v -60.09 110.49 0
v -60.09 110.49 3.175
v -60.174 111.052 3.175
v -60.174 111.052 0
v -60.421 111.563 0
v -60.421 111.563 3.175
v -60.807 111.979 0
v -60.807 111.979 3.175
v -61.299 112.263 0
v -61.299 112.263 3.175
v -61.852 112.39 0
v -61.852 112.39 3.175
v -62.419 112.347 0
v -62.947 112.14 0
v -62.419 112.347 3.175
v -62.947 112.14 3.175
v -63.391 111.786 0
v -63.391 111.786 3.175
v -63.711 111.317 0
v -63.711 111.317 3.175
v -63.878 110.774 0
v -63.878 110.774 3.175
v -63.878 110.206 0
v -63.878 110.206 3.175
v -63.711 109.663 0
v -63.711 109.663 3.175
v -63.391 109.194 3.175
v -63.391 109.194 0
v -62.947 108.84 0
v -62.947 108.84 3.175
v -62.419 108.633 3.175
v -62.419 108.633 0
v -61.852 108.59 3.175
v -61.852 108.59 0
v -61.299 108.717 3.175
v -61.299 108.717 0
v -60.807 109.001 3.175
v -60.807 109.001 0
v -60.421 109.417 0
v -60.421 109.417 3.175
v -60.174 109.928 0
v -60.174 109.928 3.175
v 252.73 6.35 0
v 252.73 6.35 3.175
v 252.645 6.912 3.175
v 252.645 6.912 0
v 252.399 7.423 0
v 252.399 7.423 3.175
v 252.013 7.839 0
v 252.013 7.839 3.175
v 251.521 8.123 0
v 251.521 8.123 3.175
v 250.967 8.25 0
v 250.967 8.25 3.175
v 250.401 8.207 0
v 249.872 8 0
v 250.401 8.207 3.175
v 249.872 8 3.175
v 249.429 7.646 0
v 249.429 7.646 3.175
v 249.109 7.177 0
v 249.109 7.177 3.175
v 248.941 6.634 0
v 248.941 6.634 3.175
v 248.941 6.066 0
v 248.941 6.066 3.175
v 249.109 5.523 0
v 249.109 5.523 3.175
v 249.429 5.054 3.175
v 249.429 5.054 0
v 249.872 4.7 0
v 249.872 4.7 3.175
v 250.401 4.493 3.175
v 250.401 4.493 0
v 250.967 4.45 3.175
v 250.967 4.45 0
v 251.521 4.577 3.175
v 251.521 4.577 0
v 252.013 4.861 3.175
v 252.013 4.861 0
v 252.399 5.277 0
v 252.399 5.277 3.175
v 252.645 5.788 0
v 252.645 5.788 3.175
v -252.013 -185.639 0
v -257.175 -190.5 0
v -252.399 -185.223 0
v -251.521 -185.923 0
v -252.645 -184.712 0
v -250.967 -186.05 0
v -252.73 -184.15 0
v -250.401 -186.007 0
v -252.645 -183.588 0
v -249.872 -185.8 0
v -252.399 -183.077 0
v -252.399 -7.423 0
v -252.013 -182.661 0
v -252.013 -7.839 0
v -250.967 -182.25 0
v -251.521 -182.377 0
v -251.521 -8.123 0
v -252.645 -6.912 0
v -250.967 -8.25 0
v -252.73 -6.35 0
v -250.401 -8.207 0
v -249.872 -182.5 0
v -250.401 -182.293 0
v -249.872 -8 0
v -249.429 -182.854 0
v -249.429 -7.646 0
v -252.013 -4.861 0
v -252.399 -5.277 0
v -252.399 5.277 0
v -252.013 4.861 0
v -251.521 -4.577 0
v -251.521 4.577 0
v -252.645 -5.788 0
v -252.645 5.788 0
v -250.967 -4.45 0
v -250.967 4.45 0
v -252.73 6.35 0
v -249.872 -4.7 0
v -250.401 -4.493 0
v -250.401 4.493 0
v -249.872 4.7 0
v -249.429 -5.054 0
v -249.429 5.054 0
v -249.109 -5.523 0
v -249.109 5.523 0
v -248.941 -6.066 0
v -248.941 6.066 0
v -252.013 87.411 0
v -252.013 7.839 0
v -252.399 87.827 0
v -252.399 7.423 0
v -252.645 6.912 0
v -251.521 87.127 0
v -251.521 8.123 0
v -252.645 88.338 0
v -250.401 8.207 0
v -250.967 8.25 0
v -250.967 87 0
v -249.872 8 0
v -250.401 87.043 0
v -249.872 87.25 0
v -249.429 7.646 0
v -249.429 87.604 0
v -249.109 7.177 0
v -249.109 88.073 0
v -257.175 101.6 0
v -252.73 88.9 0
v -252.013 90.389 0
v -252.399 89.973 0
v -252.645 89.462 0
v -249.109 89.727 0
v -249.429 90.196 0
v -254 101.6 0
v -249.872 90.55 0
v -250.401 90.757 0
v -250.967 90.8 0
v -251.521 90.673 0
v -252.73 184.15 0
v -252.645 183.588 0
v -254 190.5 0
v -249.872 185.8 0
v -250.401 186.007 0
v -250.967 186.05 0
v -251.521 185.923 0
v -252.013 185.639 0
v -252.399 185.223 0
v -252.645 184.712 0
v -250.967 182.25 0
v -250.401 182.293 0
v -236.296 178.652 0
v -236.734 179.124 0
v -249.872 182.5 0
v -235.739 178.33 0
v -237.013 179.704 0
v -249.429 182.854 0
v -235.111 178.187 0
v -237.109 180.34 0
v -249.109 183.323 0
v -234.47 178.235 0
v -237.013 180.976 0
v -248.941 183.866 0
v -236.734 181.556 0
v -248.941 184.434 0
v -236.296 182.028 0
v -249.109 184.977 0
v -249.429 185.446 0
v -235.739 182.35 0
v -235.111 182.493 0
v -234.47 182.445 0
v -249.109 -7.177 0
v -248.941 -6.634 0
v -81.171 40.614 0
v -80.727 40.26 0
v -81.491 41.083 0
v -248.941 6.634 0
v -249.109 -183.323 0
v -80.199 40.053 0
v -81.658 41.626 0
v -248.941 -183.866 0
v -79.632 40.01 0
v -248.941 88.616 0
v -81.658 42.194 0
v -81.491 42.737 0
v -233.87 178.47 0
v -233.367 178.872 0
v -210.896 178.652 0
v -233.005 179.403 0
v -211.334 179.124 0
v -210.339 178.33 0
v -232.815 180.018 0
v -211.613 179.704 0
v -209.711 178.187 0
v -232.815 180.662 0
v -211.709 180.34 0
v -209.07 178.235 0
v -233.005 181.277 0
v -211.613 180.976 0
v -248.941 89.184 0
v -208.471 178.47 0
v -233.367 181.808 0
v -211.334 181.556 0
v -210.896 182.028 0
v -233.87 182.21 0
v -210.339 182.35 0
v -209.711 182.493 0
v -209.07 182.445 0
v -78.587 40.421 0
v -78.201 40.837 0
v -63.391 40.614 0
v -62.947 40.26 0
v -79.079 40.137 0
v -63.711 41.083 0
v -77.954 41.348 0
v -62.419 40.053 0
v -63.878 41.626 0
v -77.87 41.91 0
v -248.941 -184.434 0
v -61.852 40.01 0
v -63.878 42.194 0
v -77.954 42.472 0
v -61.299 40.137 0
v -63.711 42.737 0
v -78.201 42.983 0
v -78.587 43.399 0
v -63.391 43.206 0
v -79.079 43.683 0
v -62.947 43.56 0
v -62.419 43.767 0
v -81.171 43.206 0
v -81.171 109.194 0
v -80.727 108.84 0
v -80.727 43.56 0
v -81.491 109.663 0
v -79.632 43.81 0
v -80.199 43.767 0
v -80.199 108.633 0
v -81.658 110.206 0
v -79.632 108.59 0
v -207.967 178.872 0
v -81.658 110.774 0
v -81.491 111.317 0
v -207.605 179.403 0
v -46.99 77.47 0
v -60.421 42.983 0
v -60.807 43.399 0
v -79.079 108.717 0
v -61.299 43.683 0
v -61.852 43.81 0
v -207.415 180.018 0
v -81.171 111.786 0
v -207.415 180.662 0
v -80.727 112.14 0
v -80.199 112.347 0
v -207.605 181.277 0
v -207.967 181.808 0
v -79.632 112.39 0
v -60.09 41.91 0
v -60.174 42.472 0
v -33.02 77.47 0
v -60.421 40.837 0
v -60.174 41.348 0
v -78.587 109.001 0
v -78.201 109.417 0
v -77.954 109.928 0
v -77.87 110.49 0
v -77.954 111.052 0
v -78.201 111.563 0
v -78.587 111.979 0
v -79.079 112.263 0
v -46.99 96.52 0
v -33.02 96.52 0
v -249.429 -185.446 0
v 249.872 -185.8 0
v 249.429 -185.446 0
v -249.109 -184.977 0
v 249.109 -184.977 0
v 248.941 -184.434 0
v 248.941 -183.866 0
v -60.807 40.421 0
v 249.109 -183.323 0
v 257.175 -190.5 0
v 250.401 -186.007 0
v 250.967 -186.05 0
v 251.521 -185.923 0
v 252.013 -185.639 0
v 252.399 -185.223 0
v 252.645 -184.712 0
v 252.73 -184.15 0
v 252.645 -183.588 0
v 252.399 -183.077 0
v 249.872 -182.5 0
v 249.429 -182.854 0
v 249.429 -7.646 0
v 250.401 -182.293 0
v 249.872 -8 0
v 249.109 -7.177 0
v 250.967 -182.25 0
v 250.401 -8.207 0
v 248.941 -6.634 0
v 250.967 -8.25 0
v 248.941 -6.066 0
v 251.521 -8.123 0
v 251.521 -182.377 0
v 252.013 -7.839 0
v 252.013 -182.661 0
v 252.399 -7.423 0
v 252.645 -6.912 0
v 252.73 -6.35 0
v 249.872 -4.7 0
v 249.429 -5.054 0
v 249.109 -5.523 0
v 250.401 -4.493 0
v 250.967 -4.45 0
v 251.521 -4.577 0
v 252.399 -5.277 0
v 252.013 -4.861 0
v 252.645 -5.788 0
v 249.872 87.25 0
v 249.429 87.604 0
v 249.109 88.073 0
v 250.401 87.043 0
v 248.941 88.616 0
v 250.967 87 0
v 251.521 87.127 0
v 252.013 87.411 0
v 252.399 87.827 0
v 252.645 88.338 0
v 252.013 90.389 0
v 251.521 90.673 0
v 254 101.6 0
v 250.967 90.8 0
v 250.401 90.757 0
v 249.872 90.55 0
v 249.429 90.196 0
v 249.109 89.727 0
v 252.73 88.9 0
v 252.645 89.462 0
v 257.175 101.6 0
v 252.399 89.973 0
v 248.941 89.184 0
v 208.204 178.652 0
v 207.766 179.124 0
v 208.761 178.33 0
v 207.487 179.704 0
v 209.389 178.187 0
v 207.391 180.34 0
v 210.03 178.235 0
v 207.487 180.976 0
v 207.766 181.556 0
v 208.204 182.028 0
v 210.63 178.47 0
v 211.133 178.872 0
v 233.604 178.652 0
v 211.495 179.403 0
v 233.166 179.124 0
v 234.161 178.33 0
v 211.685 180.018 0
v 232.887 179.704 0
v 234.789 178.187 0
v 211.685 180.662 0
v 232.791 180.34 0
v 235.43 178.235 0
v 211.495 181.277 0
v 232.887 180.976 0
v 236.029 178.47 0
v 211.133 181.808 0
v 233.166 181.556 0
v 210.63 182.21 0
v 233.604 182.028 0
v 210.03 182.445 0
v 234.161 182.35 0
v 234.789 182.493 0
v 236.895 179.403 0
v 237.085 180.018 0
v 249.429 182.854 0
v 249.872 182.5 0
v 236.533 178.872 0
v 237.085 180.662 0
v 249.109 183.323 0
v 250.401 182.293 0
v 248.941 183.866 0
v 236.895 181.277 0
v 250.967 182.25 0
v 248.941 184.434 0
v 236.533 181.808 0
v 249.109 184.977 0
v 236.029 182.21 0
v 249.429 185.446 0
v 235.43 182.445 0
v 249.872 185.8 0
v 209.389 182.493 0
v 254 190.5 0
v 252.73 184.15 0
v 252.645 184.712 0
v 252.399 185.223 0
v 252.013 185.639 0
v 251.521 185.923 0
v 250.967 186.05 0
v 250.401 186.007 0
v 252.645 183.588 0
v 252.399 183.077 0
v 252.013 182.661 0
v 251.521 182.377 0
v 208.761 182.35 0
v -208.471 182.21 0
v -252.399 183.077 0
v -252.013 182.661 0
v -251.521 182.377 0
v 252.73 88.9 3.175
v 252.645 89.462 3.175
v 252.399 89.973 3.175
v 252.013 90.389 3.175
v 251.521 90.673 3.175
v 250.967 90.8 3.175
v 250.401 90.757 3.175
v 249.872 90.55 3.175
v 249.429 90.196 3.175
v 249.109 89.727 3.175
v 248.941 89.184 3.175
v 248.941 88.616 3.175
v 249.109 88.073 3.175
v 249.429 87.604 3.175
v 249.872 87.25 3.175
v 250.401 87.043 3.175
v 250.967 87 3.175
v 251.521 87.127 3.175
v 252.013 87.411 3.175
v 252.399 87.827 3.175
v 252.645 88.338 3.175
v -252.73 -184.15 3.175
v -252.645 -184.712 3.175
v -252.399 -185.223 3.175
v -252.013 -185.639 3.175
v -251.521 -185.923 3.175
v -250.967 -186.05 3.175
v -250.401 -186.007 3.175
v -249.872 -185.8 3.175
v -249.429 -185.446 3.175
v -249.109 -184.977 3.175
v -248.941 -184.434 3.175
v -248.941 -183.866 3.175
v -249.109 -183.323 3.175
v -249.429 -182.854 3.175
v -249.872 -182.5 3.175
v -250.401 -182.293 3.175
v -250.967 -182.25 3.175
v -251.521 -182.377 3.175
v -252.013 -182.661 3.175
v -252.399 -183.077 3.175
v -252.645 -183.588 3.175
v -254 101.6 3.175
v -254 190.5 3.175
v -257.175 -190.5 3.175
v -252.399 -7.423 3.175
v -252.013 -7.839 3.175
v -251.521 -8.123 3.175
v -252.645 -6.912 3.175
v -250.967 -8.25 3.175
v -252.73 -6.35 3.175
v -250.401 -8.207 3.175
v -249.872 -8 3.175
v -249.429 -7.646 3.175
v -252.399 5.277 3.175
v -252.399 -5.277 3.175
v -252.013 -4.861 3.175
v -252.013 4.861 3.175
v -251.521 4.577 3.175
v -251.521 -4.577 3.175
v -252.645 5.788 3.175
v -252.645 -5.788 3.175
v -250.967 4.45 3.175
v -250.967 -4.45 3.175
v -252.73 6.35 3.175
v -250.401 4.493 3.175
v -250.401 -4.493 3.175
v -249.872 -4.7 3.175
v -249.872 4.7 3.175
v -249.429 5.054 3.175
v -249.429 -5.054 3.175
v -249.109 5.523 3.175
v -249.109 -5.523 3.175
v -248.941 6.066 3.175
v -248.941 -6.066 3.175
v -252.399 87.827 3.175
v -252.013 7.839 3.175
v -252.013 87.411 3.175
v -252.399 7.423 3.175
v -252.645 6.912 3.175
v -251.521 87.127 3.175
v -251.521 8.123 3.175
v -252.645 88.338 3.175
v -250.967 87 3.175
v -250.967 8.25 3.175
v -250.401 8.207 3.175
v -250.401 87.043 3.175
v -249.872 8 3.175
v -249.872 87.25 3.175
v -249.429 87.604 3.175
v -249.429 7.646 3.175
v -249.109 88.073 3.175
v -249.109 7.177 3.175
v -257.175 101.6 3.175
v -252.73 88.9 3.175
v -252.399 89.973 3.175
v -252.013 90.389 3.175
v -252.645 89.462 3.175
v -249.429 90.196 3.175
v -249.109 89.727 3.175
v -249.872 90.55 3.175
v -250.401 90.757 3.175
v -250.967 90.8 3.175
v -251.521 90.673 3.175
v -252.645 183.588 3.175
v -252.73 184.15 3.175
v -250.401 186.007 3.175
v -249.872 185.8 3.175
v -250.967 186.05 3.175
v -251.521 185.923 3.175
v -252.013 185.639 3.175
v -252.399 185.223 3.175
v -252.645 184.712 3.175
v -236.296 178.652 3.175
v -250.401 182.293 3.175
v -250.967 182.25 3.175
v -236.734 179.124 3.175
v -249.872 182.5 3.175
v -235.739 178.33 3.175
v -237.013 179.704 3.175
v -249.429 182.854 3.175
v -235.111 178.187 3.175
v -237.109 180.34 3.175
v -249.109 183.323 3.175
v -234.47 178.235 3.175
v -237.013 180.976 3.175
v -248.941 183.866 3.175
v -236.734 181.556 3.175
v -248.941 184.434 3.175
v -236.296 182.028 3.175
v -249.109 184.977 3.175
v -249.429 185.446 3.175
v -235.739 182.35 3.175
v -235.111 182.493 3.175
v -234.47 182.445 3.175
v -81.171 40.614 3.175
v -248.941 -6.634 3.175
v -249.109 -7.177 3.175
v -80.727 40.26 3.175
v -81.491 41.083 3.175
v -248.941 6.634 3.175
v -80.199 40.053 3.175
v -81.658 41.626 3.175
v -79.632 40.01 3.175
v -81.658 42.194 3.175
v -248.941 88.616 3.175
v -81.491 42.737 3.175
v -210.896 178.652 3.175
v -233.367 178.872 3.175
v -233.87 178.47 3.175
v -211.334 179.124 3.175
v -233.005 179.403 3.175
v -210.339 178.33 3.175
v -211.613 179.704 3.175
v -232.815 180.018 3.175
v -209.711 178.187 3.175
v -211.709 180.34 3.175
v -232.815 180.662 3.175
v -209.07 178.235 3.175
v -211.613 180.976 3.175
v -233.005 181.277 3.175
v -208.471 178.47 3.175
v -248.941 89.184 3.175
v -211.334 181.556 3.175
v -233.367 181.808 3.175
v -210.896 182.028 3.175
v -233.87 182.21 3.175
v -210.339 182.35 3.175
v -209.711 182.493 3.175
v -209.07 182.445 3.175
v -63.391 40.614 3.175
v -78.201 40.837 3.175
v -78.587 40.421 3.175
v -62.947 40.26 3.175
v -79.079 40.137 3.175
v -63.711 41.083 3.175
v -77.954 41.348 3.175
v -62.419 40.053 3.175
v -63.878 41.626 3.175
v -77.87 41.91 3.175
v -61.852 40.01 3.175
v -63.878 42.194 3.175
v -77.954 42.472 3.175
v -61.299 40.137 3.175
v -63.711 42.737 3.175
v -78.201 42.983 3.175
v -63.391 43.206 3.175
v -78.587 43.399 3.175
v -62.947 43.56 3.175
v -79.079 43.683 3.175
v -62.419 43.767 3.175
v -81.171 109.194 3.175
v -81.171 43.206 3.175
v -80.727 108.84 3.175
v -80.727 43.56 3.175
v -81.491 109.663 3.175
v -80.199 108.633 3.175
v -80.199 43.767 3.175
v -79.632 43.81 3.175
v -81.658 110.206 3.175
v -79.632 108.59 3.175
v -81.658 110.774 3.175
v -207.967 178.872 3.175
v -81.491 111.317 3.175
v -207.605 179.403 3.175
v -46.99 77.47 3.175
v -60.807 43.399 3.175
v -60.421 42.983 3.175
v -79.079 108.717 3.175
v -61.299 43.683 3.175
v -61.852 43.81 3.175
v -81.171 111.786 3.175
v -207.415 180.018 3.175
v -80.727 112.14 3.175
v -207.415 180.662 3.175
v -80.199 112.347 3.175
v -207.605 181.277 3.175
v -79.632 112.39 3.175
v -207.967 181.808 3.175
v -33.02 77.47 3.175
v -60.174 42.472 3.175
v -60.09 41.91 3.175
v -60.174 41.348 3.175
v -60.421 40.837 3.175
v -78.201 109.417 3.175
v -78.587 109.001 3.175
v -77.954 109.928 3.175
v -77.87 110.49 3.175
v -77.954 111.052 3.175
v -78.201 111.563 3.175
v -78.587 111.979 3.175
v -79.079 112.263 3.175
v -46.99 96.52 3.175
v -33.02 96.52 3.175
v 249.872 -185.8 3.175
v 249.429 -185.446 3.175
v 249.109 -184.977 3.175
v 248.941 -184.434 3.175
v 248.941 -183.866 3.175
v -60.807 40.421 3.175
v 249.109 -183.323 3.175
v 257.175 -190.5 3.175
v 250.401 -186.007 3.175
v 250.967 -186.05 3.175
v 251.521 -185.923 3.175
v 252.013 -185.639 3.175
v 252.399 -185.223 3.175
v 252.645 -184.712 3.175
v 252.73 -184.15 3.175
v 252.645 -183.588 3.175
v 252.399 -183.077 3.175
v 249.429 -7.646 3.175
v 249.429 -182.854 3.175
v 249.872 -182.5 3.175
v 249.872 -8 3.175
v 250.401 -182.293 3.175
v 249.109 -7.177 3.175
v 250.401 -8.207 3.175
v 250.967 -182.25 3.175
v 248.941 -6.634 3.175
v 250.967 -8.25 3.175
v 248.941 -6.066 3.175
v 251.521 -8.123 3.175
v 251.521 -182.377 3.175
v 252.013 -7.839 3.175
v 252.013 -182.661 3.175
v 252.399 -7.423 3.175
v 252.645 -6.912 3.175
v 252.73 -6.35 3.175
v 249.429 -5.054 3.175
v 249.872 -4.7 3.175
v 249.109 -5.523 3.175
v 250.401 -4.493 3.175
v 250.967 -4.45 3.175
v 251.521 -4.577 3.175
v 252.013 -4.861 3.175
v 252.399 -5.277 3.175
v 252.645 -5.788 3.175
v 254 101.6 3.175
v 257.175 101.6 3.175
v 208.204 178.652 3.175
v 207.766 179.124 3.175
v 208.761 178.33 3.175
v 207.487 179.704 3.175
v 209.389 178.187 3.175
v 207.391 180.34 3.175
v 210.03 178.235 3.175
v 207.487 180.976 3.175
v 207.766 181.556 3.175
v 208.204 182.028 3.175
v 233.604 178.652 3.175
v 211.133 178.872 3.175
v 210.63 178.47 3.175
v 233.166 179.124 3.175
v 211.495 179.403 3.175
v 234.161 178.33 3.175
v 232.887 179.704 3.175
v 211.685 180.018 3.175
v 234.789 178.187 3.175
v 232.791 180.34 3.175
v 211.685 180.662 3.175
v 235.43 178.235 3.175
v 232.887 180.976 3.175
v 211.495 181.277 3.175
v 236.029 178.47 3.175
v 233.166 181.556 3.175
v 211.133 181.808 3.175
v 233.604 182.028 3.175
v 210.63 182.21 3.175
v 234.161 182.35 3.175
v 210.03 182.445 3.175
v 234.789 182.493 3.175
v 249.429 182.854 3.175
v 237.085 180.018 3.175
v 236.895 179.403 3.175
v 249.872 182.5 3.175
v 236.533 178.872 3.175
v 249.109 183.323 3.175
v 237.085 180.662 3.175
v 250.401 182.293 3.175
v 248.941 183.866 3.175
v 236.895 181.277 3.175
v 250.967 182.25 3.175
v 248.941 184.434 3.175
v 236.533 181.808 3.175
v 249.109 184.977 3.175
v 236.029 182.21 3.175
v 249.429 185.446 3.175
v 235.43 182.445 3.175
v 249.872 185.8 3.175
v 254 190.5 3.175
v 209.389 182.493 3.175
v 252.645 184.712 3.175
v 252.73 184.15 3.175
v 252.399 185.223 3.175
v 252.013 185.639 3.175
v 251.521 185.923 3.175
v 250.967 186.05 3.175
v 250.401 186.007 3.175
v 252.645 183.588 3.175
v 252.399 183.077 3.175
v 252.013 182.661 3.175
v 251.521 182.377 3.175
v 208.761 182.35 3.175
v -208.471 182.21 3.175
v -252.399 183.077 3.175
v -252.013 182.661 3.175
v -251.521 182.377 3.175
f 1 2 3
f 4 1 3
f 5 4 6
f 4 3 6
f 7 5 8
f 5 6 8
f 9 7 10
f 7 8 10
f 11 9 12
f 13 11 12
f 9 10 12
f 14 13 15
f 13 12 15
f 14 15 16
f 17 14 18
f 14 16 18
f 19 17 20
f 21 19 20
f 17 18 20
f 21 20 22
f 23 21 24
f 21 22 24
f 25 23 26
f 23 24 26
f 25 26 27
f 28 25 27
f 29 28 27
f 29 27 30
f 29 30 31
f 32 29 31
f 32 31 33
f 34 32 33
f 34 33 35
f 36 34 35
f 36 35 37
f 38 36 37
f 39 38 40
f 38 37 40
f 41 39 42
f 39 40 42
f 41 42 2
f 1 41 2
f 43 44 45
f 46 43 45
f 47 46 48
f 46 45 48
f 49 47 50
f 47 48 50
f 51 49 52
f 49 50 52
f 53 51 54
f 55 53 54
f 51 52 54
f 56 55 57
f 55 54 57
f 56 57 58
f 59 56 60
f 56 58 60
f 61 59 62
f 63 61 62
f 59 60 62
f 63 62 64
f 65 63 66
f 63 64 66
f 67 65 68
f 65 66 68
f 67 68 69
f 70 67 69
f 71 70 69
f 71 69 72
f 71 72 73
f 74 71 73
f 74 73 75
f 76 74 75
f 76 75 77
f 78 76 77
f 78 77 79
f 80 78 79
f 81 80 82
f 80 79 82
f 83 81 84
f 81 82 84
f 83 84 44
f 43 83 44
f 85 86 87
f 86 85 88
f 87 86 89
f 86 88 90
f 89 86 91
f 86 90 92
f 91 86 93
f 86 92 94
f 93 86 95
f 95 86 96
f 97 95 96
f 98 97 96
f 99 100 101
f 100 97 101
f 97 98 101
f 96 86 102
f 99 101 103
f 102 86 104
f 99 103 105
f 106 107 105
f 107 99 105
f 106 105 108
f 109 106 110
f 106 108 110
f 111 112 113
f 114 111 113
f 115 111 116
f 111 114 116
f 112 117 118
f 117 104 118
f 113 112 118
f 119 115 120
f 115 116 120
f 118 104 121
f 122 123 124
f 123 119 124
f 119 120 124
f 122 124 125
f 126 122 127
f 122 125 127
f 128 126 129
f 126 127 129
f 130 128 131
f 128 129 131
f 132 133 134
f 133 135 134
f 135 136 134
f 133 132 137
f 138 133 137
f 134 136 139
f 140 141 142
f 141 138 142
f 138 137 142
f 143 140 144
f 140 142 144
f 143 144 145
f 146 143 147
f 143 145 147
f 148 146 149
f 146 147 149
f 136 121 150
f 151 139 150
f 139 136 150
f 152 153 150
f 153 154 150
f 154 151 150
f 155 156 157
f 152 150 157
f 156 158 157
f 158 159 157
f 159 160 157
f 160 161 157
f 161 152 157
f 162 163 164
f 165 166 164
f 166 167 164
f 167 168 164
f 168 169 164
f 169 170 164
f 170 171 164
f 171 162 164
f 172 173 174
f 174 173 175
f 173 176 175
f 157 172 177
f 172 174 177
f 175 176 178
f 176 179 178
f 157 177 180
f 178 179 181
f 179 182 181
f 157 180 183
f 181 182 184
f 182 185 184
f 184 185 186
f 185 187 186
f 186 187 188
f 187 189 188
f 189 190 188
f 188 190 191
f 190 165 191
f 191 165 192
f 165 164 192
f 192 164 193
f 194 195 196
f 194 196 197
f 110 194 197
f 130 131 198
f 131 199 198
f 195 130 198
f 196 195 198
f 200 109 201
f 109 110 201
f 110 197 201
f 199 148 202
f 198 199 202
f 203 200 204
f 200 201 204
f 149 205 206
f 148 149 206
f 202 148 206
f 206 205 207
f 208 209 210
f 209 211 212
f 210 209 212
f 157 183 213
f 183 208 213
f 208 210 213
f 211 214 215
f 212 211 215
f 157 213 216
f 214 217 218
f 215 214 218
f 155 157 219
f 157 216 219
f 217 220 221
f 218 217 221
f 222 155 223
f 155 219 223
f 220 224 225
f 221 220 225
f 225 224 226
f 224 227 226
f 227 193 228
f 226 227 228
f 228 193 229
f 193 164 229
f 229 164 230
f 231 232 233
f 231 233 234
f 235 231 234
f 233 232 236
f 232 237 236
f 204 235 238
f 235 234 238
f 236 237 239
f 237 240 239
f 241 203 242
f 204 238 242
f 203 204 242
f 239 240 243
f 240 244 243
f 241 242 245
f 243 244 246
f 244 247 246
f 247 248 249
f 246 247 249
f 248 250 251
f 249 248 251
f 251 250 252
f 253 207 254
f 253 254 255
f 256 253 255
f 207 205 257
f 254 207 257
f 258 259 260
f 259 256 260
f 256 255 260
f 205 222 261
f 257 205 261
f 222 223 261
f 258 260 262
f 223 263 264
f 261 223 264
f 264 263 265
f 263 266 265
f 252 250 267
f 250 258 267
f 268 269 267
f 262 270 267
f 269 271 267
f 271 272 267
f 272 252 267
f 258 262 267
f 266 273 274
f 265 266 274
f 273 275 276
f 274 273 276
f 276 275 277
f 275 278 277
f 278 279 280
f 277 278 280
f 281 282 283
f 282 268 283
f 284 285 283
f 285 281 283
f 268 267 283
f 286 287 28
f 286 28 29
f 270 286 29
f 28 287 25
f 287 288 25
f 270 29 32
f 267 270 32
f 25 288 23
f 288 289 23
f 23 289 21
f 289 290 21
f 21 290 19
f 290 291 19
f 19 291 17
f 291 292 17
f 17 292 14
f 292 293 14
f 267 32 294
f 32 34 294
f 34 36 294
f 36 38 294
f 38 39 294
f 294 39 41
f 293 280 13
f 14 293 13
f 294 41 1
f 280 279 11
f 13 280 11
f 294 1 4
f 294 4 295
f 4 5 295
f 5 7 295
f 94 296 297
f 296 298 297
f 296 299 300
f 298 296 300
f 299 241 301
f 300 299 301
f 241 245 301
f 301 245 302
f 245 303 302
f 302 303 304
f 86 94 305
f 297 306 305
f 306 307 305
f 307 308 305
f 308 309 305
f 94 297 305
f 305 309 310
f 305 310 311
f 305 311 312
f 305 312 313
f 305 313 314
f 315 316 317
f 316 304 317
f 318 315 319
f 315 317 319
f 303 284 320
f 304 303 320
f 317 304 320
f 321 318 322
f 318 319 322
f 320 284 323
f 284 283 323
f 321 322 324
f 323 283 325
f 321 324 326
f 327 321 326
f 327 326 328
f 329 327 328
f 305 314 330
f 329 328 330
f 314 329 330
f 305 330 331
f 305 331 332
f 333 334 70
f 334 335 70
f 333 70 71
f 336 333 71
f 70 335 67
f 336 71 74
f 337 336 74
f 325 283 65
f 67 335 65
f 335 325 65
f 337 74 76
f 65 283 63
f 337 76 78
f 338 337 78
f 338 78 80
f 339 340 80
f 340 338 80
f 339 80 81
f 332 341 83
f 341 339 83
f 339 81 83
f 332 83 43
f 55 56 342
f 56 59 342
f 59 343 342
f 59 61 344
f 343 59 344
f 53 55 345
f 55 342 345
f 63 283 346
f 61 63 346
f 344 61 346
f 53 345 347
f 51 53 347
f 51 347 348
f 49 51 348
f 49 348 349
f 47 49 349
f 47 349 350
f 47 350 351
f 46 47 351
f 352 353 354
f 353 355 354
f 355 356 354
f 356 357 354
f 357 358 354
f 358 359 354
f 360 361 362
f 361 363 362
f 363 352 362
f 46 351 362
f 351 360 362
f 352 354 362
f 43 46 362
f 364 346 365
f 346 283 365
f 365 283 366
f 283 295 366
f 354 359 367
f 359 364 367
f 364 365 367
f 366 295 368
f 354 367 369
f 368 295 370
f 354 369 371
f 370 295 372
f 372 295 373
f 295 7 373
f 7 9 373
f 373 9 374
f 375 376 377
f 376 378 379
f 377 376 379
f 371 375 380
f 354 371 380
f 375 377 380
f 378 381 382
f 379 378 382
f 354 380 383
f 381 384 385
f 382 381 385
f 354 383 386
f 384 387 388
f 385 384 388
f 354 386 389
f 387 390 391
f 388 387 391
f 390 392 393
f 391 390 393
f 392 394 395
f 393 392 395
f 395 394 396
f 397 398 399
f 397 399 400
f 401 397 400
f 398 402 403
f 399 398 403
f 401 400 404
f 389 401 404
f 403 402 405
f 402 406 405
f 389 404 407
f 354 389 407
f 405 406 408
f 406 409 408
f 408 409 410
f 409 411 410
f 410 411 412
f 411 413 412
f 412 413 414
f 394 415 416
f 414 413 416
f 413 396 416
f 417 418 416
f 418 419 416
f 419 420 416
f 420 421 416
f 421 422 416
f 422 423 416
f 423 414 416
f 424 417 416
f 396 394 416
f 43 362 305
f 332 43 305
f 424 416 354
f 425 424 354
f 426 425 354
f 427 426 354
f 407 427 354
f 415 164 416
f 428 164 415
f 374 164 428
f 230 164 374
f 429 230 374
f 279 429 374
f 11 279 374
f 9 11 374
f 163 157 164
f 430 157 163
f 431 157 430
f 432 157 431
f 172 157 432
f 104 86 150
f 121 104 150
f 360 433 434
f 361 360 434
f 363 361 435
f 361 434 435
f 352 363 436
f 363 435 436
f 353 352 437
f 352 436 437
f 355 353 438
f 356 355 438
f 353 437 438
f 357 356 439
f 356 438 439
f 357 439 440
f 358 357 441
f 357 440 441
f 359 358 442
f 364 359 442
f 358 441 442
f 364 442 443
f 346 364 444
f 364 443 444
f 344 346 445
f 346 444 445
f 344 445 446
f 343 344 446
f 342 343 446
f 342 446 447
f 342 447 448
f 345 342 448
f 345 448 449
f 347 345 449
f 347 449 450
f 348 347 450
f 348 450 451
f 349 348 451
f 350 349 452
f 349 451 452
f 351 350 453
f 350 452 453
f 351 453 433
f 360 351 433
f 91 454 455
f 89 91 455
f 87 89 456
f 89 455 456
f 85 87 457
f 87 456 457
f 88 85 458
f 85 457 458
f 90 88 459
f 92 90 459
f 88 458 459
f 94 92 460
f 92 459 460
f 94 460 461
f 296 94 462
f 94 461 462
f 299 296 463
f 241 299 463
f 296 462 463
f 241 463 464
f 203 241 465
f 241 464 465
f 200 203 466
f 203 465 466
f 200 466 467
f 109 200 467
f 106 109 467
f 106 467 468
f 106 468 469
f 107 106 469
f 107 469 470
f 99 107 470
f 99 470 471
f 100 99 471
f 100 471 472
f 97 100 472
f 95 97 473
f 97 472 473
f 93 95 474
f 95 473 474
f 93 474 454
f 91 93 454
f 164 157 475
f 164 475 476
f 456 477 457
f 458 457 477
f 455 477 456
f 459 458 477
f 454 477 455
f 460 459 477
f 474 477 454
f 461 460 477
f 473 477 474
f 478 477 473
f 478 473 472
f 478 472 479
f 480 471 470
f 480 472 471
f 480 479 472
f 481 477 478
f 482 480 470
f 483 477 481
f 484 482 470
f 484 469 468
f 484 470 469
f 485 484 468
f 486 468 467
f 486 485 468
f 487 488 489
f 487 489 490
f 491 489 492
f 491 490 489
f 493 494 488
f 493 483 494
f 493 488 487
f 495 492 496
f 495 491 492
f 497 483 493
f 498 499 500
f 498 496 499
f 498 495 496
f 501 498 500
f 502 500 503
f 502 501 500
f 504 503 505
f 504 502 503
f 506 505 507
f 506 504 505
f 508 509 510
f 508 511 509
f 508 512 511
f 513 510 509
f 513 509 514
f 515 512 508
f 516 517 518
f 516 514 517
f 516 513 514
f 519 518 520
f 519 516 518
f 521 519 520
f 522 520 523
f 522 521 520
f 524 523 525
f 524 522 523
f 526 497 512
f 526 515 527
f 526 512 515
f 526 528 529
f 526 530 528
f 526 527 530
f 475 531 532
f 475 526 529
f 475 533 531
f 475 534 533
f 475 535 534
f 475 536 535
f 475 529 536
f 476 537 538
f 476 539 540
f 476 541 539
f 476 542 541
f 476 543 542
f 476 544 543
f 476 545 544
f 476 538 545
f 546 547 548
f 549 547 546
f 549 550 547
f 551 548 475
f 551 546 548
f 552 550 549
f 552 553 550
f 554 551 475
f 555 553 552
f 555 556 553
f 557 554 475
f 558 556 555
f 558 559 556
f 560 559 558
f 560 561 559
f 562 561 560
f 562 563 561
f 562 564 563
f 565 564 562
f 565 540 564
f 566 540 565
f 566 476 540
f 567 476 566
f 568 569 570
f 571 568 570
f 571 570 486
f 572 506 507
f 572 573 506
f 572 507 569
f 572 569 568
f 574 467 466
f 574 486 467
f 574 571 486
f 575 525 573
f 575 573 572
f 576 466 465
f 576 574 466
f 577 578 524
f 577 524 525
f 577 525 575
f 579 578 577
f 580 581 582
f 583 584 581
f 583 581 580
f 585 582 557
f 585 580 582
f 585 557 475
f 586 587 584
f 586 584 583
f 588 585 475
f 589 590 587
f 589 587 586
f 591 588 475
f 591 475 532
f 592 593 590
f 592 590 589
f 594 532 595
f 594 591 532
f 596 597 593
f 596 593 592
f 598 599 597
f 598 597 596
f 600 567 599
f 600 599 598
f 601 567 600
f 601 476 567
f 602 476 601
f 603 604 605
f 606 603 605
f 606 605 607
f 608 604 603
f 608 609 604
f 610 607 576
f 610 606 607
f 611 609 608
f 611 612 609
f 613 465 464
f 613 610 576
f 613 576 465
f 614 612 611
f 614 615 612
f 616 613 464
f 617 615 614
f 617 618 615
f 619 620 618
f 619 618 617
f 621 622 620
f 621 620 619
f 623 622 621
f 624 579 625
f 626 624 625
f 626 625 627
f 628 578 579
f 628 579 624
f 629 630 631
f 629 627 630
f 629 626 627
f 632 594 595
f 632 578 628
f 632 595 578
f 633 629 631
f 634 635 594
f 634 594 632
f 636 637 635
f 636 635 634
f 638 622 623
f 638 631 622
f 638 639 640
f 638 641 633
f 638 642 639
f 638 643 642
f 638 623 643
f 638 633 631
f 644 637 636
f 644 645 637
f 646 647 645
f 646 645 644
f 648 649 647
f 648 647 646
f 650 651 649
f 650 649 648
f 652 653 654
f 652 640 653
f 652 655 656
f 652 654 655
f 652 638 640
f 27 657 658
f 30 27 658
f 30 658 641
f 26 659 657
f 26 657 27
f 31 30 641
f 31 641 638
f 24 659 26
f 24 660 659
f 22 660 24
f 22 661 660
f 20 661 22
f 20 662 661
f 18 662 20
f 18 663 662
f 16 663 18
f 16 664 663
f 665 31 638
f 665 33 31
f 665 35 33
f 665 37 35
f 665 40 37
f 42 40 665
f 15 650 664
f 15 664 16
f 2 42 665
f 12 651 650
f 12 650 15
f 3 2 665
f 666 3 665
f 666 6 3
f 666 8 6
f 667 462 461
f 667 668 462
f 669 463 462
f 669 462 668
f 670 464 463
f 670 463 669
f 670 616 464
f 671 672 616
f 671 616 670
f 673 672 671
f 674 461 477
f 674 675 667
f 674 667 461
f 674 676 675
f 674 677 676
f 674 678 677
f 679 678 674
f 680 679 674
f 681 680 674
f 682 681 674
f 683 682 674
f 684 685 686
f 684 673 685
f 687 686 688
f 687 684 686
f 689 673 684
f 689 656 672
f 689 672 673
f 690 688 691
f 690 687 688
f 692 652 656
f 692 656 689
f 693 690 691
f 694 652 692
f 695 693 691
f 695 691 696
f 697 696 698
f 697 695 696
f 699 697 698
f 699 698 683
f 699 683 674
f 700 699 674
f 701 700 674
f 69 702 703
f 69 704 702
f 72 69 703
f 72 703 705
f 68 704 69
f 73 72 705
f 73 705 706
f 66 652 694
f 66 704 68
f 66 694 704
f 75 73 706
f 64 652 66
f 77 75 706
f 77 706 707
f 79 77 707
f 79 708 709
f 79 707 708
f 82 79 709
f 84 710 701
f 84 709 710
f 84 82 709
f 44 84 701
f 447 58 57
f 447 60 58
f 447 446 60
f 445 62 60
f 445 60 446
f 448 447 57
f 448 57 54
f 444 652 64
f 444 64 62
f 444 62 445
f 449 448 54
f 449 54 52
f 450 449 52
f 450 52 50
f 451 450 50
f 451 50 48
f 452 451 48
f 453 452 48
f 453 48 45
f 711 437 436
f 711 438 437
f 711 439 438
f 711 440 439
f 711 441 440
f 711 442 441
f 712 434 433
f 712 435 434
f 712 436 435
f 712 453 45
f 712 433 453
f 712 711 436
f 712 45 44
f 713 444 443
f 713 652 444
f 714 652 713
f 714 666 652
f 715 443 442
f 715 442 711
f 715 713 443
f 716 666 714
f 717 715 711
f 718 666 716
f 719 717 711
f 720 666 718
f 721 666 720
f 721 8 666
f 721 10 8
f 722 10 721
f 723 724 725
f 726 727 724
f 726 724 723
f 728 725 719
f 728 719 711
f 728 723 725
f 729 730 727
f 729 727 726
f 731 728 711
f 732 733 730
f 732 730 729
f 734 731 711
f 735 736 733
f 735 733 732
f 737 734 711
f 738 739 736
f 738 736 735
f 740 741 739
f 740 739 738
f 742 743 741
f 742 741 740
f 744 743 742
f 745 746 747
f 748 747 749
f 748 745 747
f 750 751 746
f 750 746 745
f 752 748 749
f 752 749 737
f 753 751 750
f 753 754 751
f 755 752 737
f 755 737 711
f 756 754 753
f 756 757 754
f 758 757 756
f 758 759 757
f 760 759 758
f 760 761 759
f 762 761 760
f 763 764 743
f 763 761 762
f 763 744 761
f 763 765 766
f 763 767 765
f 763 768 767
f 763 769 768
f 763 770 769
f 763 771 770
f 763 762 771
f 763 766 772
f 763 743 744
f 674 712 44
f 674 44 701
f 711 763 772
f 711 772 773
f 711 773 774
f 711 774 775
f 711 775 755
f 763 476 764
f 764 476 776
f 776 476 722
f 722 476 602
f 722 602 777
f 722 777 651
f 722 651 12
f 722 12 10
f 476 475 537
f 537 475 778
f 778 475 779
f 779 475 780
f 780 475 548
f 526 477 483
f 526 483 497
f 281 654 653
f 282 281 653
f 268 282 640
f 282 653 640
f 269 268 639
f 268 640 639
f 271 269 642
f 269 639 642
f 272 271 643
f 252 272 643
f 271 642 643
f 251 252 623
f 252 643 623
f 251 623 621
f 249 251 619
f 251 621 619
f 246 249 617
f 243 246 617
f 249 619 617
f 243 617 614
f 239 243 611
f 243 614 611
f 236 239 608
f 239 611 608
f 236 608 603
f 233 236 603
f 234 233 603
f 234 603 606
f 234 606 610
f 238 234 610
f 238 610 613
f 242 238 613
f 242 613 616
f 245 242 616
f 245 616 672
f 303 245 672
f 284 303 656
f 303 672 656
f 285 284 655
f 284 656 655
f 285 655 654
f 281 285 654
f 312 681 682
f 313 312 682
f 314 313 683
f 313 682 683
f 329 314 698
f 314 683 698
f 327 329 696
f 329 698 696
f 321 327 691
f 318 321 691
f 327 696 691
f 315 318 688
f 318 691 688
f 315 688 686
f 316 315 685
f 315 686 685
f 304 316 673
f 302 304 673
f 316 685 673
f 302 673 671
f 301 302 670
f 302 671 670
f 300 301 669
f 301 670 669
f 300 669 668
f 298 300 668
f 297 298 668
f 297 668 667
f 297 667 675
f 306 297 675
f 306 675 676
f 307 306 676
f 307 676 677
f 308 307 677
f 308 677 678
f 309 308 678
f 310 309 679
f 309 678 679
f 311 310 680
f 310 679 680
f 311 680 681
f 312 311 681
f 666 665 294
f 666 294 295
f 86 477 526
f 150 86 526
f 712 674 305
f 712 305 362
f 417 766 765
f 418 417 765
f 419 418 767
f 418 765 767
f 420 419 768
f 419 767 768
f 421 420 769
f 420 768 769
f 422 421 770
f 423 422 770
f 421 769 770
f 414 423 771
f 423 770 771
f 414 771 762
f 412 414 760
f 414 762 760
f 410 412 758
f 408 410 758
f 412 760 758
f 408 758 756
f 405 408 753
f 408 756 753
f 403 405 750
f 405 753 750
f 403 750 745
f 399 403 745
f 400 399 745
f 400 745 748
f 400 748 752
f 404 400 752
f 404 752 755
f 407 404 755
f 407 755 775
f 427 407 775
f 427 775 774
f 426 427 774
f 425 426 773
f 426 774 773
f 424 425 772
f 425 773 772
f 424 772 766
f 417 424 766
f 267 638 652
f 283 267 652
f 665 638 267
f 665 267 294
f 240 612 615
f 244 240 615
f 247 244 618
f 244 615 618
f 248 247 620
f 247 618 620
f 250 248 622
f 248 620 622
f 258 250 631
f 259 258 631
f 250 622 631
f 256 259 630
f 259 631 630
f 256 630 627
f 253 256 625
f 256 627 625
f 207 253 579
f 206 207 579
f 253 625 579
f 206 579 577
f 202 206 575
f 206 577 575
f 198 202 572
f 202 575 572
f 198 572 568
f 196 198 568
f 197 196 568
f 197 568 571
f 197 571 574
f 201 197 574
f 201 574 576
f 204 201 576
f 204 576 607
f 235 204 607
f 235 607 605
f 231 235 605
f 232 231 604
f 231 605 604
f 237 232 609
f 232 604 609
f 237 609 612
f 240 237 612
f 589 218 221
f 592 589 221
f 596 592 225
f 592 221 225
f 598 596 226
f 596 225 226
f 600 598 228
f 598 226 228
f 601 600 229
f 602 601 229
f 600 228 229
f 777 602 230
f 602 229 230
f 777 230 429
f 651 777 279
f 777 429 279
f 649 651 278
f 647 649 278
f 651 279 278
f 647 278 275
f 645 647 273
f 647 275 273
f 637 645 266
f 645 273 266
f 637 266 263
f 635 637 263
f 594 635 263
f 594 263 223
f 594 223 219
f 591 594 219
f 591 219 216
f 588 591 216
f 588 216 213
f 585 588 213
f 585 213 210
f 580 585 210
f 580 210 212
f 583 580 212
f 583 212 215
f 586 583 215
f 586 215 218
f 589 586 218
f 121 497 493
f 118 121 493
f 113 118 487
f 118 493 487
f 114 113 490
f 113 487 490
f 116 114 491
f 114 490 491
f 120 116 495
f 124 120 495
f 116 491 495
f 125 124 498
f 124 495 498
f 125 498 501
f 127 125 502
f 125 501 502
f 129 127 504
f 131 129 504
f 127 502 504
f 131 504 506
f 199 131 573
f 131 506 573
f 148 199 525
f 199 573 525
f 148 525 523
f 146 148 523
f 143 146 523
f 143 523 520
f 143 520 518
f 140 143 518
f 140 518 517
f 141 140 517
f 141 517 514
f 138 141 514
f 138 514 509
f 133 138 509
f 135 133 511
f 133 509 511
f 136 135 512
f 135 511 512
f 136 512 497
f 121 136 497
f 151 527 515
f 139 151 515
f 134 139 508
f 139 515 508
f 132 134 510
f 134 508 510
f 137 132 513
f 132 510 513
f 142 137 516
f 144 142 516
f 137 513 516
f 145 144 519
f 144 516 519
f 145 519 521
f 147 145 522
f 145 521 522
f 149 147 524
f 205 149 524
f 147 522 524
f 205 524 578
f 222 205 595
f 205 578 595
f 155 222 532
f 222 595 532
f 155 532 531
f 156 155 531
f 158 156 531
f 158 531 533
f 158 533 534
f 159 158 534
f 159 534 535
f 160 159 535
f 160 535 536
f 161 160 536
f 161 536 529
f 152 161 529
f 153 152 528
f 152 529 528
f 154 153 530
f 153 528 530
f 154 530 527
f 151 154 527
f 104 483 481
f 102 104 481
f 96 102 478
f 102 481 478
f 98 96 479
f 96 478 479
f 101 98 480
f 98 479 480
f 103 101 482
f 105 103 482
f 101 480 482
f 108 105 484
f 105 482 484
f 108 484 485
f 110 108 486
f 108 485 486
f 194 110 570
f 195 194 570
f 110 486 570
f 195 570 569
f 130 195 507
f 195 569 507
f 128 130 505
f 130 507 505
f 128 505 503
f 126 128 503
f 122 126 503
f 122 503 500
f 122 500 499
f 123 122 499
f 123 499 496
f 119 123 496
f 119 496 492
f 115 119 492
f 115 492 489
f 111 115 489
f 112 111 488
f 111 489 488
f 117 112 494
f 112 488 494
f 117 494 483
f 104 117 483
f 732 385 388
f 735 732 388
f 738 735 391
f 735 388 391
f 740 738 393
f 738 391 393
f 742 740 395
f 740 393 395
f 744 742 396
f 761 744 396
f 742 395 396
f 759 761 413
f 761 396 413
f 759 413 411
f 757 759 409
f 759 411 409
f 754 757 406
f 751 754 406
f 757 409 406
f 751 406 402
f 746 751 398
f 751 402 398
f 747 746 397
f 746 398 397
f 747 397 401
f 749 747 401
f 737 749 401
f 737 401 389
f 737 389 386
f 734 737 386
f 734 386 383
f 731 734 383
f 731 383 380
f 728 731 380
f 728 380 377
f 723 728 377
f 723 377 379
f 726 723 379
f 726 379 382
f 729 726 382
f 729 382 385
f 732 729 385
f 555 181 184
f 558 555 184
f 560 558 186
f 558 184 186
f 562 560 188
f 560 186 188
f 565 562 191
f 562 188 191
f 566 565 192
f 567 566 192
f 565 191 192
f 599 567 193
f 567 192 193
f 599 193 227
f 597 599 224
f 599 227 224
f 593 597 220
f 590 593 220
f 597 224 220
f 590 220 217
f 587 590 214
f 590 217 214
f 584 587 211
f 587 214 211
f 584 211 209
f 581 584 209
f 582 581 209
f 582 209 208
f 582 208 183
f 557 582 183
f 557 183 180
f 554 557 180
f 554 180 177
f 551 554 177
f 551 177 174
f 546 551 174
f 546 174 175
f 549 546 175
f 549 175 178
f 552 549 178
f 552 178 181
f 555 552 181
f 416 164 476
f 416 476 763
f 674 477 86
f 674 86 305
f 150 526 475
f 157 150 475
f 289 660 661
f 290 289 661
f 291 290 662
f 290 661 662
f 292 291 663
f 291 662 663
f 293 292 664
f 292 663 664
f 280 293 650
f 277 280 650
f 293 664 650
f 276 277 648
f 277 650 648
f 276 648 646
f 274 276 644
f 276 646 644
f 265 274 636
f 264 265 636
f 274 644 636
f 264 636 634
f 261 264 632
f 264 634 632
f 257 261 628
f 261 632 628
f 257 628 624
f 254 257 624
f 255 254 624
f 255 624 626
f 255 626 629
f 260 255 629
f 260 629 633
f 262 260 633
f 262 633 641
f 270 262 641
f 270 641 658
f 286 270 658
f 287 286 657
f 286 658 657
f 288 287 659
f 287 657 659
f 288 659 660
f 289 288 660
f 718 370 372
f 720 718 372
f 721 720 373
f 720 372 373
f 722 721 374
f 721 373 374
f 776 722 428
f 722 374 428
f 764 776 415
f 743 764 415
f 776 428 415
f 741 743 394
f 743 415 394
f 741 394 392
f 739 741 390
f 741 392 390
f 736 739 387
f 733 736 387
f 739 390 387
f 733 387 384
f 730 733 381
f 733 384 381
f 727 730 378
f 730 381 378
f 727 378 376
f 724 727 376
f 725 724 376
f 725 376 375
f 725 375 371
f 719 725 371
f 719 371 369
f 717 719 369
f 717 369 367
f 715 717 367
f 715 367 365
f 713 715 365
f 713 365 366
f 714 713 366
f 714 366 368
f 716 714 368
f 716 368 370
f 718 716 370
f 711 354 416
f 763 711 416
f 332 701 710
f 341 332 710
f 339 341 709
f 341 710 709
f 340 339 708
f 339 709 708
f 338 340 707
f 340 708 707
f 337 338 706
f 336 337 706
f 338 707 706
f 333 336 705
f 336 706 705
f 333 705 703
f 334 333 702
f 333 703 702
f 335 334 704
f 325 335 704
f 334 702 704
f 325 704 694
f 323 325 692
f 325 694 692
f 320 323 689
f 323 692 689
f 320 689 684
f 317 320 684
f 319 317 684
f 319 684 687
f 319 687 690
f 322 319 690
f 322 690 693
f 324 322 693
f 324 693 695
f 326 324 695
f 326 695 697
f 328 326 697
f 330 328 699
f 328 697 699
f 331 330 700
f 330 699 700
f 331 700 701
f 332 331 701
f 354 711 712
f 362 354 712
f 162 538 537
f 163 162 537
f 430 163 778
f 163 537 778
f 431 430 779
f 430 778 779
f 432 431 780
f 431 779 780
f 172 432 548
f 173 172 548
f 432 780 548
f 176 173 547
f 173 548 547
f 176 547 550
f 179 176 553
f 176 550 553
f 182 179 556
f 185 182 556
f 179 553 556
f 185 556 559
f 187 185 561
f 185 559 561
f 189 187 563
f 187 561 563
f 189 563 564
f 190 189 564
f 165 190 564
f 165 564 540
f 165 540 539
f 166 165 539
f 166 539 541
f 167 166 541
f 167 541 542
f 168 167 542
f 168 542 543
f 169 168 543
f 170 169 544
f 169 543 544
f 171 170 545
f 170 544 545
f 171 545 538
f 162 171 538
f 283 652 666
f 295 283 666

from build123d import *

# Parameters (mm, degrees)
SKETCH1_W           = 508
SKETCH1_H           = 381
BOSS_EXTRUDE1_DEPTH = 3.175
SKETCH3_W           = 13.97
SKETCH3_H           = 19.05
CUT_EXTRUDE2_DEPTH  = 3.175
SKETCH2_R           = 1.905
CUT_EXTRUDE1_DEPTH  = 3.175
SKETCH4_W           = 3.175
SKETCH4_H           = 292.1
BOSS_EXTRUDE2_DEPTH = 3.175
SKETCH5_R           = 2.159
CUT_EXTRUDE3_DEPTH  = 321.061417934


with BuildPart() as part:
    # Sketch1 → Boss-Extrude1 (new body)
    with BuildSketch(Plane.XY):
        Rectangle(SKETCH1_W, SKETCH1_H)
    extrude(amount=BOSS_EXTRUDE1_DEPTH)

    # Sketch3 → Cut-Extrude2 (cut)
    with BuildSketch(Plane.XY.offset(3.175)):
        with Locations((-40.005, 86.995)):
            Rectangle(SKETCH3_W, SKETCH3_H)
    extrude(amount=-CUT_EXTRUDE2_DEPTH, mode=Mode.SUBTRACT)

    # Sketch2 → Cut-Extrude1 (cut)
    with BuildSketch(Plane.XY.offset(3.175)):
        with Locations((250.825, 184.15)):
            Circle(SKETCH2_R)
        with Locations((250.825, -184.15)):
            Circle(SKETCH2_R)
        with Locations((-79.774669, 110.49)):
            Circle(SKETCH2_R)
        with Locations((-79.774669, 41.91)):
            Circle(SKETCH2_R)
        with Locations((-61.994669, 110.49)):
            Circle(SKETCH2_R)
        with Locations((-61.994669, 41.91)):
            Circle(SKETCH2_R)
        with Locations(Location((-250.825, 184.15, 0), (0, 0, 180))):
            Circle(SKETCH2_R)
        with Locations(Location((-250.825, 88.9, 0), (0, 0, 180))):
            Circle(SKETCH2_R)
        with Locations((250.825, 88.9)):
            Circle(SKETCH2_R)
        with Locations((250.825, 6.35)):
            Circle(SKETCH2_R)
        with Locations((250.825, -6.35)):
            Circle(SKETCH2_R)
        with Locations(Location((-250.825, 6.35, 0), (0, 0, 180))):
            Circle(SKETCH2_R)
        with Locations(Location((-250.825, -6.35, 0), (0, 0, 180))):
            Circle(SKETCH2_R)
        with Locations(Location((-250.825, -184.15, 0), (0, 0, 180))):
            Circle(SKETCH2_R)
    extrude(amount=-CUT_EXTRUDE1_DEPTH, mode=Mode.SUBTRACT)

    # Sketch4 → Boss-Extrude2 (add)
    with BuildSketch(Plane.XY.offset(3.175)):
        with Locations((255.5875, -44.45)):
            Rectangle(SKETCH4_W, SKETCH4_H)
        with Locations((-255.5875, -44.45)):
            Rectangle(SKETCH4_W, SKETCH4_H)
    extrude(amount=-BOSS_EXTRUDE2_DEPTH)

    # Sketch5 → Cut-Extrude3 (cut, through all)
    with BuildSketch(Plane(origin=(0, 0, 0), x_dir=(-1, 0, 0), z_dir=(0, 0, -1))):
        with Locations((234.95, 180.34)):
            Circle(SKETCH5_R)
        with Locations((209.55, 180.34)):
            Circle(SKETCH5_R)
        with Locations((-234.95, 180.34)):
            Circle(SKETCH5_R)
        with Locations((-209.55, 180.34)):
            Circle(SKETCH5_R)
    extrude(amount=-CUT_EXTRUDE3_DEPTH, mode=Mode.SUBTRACT)


solid = part.part
